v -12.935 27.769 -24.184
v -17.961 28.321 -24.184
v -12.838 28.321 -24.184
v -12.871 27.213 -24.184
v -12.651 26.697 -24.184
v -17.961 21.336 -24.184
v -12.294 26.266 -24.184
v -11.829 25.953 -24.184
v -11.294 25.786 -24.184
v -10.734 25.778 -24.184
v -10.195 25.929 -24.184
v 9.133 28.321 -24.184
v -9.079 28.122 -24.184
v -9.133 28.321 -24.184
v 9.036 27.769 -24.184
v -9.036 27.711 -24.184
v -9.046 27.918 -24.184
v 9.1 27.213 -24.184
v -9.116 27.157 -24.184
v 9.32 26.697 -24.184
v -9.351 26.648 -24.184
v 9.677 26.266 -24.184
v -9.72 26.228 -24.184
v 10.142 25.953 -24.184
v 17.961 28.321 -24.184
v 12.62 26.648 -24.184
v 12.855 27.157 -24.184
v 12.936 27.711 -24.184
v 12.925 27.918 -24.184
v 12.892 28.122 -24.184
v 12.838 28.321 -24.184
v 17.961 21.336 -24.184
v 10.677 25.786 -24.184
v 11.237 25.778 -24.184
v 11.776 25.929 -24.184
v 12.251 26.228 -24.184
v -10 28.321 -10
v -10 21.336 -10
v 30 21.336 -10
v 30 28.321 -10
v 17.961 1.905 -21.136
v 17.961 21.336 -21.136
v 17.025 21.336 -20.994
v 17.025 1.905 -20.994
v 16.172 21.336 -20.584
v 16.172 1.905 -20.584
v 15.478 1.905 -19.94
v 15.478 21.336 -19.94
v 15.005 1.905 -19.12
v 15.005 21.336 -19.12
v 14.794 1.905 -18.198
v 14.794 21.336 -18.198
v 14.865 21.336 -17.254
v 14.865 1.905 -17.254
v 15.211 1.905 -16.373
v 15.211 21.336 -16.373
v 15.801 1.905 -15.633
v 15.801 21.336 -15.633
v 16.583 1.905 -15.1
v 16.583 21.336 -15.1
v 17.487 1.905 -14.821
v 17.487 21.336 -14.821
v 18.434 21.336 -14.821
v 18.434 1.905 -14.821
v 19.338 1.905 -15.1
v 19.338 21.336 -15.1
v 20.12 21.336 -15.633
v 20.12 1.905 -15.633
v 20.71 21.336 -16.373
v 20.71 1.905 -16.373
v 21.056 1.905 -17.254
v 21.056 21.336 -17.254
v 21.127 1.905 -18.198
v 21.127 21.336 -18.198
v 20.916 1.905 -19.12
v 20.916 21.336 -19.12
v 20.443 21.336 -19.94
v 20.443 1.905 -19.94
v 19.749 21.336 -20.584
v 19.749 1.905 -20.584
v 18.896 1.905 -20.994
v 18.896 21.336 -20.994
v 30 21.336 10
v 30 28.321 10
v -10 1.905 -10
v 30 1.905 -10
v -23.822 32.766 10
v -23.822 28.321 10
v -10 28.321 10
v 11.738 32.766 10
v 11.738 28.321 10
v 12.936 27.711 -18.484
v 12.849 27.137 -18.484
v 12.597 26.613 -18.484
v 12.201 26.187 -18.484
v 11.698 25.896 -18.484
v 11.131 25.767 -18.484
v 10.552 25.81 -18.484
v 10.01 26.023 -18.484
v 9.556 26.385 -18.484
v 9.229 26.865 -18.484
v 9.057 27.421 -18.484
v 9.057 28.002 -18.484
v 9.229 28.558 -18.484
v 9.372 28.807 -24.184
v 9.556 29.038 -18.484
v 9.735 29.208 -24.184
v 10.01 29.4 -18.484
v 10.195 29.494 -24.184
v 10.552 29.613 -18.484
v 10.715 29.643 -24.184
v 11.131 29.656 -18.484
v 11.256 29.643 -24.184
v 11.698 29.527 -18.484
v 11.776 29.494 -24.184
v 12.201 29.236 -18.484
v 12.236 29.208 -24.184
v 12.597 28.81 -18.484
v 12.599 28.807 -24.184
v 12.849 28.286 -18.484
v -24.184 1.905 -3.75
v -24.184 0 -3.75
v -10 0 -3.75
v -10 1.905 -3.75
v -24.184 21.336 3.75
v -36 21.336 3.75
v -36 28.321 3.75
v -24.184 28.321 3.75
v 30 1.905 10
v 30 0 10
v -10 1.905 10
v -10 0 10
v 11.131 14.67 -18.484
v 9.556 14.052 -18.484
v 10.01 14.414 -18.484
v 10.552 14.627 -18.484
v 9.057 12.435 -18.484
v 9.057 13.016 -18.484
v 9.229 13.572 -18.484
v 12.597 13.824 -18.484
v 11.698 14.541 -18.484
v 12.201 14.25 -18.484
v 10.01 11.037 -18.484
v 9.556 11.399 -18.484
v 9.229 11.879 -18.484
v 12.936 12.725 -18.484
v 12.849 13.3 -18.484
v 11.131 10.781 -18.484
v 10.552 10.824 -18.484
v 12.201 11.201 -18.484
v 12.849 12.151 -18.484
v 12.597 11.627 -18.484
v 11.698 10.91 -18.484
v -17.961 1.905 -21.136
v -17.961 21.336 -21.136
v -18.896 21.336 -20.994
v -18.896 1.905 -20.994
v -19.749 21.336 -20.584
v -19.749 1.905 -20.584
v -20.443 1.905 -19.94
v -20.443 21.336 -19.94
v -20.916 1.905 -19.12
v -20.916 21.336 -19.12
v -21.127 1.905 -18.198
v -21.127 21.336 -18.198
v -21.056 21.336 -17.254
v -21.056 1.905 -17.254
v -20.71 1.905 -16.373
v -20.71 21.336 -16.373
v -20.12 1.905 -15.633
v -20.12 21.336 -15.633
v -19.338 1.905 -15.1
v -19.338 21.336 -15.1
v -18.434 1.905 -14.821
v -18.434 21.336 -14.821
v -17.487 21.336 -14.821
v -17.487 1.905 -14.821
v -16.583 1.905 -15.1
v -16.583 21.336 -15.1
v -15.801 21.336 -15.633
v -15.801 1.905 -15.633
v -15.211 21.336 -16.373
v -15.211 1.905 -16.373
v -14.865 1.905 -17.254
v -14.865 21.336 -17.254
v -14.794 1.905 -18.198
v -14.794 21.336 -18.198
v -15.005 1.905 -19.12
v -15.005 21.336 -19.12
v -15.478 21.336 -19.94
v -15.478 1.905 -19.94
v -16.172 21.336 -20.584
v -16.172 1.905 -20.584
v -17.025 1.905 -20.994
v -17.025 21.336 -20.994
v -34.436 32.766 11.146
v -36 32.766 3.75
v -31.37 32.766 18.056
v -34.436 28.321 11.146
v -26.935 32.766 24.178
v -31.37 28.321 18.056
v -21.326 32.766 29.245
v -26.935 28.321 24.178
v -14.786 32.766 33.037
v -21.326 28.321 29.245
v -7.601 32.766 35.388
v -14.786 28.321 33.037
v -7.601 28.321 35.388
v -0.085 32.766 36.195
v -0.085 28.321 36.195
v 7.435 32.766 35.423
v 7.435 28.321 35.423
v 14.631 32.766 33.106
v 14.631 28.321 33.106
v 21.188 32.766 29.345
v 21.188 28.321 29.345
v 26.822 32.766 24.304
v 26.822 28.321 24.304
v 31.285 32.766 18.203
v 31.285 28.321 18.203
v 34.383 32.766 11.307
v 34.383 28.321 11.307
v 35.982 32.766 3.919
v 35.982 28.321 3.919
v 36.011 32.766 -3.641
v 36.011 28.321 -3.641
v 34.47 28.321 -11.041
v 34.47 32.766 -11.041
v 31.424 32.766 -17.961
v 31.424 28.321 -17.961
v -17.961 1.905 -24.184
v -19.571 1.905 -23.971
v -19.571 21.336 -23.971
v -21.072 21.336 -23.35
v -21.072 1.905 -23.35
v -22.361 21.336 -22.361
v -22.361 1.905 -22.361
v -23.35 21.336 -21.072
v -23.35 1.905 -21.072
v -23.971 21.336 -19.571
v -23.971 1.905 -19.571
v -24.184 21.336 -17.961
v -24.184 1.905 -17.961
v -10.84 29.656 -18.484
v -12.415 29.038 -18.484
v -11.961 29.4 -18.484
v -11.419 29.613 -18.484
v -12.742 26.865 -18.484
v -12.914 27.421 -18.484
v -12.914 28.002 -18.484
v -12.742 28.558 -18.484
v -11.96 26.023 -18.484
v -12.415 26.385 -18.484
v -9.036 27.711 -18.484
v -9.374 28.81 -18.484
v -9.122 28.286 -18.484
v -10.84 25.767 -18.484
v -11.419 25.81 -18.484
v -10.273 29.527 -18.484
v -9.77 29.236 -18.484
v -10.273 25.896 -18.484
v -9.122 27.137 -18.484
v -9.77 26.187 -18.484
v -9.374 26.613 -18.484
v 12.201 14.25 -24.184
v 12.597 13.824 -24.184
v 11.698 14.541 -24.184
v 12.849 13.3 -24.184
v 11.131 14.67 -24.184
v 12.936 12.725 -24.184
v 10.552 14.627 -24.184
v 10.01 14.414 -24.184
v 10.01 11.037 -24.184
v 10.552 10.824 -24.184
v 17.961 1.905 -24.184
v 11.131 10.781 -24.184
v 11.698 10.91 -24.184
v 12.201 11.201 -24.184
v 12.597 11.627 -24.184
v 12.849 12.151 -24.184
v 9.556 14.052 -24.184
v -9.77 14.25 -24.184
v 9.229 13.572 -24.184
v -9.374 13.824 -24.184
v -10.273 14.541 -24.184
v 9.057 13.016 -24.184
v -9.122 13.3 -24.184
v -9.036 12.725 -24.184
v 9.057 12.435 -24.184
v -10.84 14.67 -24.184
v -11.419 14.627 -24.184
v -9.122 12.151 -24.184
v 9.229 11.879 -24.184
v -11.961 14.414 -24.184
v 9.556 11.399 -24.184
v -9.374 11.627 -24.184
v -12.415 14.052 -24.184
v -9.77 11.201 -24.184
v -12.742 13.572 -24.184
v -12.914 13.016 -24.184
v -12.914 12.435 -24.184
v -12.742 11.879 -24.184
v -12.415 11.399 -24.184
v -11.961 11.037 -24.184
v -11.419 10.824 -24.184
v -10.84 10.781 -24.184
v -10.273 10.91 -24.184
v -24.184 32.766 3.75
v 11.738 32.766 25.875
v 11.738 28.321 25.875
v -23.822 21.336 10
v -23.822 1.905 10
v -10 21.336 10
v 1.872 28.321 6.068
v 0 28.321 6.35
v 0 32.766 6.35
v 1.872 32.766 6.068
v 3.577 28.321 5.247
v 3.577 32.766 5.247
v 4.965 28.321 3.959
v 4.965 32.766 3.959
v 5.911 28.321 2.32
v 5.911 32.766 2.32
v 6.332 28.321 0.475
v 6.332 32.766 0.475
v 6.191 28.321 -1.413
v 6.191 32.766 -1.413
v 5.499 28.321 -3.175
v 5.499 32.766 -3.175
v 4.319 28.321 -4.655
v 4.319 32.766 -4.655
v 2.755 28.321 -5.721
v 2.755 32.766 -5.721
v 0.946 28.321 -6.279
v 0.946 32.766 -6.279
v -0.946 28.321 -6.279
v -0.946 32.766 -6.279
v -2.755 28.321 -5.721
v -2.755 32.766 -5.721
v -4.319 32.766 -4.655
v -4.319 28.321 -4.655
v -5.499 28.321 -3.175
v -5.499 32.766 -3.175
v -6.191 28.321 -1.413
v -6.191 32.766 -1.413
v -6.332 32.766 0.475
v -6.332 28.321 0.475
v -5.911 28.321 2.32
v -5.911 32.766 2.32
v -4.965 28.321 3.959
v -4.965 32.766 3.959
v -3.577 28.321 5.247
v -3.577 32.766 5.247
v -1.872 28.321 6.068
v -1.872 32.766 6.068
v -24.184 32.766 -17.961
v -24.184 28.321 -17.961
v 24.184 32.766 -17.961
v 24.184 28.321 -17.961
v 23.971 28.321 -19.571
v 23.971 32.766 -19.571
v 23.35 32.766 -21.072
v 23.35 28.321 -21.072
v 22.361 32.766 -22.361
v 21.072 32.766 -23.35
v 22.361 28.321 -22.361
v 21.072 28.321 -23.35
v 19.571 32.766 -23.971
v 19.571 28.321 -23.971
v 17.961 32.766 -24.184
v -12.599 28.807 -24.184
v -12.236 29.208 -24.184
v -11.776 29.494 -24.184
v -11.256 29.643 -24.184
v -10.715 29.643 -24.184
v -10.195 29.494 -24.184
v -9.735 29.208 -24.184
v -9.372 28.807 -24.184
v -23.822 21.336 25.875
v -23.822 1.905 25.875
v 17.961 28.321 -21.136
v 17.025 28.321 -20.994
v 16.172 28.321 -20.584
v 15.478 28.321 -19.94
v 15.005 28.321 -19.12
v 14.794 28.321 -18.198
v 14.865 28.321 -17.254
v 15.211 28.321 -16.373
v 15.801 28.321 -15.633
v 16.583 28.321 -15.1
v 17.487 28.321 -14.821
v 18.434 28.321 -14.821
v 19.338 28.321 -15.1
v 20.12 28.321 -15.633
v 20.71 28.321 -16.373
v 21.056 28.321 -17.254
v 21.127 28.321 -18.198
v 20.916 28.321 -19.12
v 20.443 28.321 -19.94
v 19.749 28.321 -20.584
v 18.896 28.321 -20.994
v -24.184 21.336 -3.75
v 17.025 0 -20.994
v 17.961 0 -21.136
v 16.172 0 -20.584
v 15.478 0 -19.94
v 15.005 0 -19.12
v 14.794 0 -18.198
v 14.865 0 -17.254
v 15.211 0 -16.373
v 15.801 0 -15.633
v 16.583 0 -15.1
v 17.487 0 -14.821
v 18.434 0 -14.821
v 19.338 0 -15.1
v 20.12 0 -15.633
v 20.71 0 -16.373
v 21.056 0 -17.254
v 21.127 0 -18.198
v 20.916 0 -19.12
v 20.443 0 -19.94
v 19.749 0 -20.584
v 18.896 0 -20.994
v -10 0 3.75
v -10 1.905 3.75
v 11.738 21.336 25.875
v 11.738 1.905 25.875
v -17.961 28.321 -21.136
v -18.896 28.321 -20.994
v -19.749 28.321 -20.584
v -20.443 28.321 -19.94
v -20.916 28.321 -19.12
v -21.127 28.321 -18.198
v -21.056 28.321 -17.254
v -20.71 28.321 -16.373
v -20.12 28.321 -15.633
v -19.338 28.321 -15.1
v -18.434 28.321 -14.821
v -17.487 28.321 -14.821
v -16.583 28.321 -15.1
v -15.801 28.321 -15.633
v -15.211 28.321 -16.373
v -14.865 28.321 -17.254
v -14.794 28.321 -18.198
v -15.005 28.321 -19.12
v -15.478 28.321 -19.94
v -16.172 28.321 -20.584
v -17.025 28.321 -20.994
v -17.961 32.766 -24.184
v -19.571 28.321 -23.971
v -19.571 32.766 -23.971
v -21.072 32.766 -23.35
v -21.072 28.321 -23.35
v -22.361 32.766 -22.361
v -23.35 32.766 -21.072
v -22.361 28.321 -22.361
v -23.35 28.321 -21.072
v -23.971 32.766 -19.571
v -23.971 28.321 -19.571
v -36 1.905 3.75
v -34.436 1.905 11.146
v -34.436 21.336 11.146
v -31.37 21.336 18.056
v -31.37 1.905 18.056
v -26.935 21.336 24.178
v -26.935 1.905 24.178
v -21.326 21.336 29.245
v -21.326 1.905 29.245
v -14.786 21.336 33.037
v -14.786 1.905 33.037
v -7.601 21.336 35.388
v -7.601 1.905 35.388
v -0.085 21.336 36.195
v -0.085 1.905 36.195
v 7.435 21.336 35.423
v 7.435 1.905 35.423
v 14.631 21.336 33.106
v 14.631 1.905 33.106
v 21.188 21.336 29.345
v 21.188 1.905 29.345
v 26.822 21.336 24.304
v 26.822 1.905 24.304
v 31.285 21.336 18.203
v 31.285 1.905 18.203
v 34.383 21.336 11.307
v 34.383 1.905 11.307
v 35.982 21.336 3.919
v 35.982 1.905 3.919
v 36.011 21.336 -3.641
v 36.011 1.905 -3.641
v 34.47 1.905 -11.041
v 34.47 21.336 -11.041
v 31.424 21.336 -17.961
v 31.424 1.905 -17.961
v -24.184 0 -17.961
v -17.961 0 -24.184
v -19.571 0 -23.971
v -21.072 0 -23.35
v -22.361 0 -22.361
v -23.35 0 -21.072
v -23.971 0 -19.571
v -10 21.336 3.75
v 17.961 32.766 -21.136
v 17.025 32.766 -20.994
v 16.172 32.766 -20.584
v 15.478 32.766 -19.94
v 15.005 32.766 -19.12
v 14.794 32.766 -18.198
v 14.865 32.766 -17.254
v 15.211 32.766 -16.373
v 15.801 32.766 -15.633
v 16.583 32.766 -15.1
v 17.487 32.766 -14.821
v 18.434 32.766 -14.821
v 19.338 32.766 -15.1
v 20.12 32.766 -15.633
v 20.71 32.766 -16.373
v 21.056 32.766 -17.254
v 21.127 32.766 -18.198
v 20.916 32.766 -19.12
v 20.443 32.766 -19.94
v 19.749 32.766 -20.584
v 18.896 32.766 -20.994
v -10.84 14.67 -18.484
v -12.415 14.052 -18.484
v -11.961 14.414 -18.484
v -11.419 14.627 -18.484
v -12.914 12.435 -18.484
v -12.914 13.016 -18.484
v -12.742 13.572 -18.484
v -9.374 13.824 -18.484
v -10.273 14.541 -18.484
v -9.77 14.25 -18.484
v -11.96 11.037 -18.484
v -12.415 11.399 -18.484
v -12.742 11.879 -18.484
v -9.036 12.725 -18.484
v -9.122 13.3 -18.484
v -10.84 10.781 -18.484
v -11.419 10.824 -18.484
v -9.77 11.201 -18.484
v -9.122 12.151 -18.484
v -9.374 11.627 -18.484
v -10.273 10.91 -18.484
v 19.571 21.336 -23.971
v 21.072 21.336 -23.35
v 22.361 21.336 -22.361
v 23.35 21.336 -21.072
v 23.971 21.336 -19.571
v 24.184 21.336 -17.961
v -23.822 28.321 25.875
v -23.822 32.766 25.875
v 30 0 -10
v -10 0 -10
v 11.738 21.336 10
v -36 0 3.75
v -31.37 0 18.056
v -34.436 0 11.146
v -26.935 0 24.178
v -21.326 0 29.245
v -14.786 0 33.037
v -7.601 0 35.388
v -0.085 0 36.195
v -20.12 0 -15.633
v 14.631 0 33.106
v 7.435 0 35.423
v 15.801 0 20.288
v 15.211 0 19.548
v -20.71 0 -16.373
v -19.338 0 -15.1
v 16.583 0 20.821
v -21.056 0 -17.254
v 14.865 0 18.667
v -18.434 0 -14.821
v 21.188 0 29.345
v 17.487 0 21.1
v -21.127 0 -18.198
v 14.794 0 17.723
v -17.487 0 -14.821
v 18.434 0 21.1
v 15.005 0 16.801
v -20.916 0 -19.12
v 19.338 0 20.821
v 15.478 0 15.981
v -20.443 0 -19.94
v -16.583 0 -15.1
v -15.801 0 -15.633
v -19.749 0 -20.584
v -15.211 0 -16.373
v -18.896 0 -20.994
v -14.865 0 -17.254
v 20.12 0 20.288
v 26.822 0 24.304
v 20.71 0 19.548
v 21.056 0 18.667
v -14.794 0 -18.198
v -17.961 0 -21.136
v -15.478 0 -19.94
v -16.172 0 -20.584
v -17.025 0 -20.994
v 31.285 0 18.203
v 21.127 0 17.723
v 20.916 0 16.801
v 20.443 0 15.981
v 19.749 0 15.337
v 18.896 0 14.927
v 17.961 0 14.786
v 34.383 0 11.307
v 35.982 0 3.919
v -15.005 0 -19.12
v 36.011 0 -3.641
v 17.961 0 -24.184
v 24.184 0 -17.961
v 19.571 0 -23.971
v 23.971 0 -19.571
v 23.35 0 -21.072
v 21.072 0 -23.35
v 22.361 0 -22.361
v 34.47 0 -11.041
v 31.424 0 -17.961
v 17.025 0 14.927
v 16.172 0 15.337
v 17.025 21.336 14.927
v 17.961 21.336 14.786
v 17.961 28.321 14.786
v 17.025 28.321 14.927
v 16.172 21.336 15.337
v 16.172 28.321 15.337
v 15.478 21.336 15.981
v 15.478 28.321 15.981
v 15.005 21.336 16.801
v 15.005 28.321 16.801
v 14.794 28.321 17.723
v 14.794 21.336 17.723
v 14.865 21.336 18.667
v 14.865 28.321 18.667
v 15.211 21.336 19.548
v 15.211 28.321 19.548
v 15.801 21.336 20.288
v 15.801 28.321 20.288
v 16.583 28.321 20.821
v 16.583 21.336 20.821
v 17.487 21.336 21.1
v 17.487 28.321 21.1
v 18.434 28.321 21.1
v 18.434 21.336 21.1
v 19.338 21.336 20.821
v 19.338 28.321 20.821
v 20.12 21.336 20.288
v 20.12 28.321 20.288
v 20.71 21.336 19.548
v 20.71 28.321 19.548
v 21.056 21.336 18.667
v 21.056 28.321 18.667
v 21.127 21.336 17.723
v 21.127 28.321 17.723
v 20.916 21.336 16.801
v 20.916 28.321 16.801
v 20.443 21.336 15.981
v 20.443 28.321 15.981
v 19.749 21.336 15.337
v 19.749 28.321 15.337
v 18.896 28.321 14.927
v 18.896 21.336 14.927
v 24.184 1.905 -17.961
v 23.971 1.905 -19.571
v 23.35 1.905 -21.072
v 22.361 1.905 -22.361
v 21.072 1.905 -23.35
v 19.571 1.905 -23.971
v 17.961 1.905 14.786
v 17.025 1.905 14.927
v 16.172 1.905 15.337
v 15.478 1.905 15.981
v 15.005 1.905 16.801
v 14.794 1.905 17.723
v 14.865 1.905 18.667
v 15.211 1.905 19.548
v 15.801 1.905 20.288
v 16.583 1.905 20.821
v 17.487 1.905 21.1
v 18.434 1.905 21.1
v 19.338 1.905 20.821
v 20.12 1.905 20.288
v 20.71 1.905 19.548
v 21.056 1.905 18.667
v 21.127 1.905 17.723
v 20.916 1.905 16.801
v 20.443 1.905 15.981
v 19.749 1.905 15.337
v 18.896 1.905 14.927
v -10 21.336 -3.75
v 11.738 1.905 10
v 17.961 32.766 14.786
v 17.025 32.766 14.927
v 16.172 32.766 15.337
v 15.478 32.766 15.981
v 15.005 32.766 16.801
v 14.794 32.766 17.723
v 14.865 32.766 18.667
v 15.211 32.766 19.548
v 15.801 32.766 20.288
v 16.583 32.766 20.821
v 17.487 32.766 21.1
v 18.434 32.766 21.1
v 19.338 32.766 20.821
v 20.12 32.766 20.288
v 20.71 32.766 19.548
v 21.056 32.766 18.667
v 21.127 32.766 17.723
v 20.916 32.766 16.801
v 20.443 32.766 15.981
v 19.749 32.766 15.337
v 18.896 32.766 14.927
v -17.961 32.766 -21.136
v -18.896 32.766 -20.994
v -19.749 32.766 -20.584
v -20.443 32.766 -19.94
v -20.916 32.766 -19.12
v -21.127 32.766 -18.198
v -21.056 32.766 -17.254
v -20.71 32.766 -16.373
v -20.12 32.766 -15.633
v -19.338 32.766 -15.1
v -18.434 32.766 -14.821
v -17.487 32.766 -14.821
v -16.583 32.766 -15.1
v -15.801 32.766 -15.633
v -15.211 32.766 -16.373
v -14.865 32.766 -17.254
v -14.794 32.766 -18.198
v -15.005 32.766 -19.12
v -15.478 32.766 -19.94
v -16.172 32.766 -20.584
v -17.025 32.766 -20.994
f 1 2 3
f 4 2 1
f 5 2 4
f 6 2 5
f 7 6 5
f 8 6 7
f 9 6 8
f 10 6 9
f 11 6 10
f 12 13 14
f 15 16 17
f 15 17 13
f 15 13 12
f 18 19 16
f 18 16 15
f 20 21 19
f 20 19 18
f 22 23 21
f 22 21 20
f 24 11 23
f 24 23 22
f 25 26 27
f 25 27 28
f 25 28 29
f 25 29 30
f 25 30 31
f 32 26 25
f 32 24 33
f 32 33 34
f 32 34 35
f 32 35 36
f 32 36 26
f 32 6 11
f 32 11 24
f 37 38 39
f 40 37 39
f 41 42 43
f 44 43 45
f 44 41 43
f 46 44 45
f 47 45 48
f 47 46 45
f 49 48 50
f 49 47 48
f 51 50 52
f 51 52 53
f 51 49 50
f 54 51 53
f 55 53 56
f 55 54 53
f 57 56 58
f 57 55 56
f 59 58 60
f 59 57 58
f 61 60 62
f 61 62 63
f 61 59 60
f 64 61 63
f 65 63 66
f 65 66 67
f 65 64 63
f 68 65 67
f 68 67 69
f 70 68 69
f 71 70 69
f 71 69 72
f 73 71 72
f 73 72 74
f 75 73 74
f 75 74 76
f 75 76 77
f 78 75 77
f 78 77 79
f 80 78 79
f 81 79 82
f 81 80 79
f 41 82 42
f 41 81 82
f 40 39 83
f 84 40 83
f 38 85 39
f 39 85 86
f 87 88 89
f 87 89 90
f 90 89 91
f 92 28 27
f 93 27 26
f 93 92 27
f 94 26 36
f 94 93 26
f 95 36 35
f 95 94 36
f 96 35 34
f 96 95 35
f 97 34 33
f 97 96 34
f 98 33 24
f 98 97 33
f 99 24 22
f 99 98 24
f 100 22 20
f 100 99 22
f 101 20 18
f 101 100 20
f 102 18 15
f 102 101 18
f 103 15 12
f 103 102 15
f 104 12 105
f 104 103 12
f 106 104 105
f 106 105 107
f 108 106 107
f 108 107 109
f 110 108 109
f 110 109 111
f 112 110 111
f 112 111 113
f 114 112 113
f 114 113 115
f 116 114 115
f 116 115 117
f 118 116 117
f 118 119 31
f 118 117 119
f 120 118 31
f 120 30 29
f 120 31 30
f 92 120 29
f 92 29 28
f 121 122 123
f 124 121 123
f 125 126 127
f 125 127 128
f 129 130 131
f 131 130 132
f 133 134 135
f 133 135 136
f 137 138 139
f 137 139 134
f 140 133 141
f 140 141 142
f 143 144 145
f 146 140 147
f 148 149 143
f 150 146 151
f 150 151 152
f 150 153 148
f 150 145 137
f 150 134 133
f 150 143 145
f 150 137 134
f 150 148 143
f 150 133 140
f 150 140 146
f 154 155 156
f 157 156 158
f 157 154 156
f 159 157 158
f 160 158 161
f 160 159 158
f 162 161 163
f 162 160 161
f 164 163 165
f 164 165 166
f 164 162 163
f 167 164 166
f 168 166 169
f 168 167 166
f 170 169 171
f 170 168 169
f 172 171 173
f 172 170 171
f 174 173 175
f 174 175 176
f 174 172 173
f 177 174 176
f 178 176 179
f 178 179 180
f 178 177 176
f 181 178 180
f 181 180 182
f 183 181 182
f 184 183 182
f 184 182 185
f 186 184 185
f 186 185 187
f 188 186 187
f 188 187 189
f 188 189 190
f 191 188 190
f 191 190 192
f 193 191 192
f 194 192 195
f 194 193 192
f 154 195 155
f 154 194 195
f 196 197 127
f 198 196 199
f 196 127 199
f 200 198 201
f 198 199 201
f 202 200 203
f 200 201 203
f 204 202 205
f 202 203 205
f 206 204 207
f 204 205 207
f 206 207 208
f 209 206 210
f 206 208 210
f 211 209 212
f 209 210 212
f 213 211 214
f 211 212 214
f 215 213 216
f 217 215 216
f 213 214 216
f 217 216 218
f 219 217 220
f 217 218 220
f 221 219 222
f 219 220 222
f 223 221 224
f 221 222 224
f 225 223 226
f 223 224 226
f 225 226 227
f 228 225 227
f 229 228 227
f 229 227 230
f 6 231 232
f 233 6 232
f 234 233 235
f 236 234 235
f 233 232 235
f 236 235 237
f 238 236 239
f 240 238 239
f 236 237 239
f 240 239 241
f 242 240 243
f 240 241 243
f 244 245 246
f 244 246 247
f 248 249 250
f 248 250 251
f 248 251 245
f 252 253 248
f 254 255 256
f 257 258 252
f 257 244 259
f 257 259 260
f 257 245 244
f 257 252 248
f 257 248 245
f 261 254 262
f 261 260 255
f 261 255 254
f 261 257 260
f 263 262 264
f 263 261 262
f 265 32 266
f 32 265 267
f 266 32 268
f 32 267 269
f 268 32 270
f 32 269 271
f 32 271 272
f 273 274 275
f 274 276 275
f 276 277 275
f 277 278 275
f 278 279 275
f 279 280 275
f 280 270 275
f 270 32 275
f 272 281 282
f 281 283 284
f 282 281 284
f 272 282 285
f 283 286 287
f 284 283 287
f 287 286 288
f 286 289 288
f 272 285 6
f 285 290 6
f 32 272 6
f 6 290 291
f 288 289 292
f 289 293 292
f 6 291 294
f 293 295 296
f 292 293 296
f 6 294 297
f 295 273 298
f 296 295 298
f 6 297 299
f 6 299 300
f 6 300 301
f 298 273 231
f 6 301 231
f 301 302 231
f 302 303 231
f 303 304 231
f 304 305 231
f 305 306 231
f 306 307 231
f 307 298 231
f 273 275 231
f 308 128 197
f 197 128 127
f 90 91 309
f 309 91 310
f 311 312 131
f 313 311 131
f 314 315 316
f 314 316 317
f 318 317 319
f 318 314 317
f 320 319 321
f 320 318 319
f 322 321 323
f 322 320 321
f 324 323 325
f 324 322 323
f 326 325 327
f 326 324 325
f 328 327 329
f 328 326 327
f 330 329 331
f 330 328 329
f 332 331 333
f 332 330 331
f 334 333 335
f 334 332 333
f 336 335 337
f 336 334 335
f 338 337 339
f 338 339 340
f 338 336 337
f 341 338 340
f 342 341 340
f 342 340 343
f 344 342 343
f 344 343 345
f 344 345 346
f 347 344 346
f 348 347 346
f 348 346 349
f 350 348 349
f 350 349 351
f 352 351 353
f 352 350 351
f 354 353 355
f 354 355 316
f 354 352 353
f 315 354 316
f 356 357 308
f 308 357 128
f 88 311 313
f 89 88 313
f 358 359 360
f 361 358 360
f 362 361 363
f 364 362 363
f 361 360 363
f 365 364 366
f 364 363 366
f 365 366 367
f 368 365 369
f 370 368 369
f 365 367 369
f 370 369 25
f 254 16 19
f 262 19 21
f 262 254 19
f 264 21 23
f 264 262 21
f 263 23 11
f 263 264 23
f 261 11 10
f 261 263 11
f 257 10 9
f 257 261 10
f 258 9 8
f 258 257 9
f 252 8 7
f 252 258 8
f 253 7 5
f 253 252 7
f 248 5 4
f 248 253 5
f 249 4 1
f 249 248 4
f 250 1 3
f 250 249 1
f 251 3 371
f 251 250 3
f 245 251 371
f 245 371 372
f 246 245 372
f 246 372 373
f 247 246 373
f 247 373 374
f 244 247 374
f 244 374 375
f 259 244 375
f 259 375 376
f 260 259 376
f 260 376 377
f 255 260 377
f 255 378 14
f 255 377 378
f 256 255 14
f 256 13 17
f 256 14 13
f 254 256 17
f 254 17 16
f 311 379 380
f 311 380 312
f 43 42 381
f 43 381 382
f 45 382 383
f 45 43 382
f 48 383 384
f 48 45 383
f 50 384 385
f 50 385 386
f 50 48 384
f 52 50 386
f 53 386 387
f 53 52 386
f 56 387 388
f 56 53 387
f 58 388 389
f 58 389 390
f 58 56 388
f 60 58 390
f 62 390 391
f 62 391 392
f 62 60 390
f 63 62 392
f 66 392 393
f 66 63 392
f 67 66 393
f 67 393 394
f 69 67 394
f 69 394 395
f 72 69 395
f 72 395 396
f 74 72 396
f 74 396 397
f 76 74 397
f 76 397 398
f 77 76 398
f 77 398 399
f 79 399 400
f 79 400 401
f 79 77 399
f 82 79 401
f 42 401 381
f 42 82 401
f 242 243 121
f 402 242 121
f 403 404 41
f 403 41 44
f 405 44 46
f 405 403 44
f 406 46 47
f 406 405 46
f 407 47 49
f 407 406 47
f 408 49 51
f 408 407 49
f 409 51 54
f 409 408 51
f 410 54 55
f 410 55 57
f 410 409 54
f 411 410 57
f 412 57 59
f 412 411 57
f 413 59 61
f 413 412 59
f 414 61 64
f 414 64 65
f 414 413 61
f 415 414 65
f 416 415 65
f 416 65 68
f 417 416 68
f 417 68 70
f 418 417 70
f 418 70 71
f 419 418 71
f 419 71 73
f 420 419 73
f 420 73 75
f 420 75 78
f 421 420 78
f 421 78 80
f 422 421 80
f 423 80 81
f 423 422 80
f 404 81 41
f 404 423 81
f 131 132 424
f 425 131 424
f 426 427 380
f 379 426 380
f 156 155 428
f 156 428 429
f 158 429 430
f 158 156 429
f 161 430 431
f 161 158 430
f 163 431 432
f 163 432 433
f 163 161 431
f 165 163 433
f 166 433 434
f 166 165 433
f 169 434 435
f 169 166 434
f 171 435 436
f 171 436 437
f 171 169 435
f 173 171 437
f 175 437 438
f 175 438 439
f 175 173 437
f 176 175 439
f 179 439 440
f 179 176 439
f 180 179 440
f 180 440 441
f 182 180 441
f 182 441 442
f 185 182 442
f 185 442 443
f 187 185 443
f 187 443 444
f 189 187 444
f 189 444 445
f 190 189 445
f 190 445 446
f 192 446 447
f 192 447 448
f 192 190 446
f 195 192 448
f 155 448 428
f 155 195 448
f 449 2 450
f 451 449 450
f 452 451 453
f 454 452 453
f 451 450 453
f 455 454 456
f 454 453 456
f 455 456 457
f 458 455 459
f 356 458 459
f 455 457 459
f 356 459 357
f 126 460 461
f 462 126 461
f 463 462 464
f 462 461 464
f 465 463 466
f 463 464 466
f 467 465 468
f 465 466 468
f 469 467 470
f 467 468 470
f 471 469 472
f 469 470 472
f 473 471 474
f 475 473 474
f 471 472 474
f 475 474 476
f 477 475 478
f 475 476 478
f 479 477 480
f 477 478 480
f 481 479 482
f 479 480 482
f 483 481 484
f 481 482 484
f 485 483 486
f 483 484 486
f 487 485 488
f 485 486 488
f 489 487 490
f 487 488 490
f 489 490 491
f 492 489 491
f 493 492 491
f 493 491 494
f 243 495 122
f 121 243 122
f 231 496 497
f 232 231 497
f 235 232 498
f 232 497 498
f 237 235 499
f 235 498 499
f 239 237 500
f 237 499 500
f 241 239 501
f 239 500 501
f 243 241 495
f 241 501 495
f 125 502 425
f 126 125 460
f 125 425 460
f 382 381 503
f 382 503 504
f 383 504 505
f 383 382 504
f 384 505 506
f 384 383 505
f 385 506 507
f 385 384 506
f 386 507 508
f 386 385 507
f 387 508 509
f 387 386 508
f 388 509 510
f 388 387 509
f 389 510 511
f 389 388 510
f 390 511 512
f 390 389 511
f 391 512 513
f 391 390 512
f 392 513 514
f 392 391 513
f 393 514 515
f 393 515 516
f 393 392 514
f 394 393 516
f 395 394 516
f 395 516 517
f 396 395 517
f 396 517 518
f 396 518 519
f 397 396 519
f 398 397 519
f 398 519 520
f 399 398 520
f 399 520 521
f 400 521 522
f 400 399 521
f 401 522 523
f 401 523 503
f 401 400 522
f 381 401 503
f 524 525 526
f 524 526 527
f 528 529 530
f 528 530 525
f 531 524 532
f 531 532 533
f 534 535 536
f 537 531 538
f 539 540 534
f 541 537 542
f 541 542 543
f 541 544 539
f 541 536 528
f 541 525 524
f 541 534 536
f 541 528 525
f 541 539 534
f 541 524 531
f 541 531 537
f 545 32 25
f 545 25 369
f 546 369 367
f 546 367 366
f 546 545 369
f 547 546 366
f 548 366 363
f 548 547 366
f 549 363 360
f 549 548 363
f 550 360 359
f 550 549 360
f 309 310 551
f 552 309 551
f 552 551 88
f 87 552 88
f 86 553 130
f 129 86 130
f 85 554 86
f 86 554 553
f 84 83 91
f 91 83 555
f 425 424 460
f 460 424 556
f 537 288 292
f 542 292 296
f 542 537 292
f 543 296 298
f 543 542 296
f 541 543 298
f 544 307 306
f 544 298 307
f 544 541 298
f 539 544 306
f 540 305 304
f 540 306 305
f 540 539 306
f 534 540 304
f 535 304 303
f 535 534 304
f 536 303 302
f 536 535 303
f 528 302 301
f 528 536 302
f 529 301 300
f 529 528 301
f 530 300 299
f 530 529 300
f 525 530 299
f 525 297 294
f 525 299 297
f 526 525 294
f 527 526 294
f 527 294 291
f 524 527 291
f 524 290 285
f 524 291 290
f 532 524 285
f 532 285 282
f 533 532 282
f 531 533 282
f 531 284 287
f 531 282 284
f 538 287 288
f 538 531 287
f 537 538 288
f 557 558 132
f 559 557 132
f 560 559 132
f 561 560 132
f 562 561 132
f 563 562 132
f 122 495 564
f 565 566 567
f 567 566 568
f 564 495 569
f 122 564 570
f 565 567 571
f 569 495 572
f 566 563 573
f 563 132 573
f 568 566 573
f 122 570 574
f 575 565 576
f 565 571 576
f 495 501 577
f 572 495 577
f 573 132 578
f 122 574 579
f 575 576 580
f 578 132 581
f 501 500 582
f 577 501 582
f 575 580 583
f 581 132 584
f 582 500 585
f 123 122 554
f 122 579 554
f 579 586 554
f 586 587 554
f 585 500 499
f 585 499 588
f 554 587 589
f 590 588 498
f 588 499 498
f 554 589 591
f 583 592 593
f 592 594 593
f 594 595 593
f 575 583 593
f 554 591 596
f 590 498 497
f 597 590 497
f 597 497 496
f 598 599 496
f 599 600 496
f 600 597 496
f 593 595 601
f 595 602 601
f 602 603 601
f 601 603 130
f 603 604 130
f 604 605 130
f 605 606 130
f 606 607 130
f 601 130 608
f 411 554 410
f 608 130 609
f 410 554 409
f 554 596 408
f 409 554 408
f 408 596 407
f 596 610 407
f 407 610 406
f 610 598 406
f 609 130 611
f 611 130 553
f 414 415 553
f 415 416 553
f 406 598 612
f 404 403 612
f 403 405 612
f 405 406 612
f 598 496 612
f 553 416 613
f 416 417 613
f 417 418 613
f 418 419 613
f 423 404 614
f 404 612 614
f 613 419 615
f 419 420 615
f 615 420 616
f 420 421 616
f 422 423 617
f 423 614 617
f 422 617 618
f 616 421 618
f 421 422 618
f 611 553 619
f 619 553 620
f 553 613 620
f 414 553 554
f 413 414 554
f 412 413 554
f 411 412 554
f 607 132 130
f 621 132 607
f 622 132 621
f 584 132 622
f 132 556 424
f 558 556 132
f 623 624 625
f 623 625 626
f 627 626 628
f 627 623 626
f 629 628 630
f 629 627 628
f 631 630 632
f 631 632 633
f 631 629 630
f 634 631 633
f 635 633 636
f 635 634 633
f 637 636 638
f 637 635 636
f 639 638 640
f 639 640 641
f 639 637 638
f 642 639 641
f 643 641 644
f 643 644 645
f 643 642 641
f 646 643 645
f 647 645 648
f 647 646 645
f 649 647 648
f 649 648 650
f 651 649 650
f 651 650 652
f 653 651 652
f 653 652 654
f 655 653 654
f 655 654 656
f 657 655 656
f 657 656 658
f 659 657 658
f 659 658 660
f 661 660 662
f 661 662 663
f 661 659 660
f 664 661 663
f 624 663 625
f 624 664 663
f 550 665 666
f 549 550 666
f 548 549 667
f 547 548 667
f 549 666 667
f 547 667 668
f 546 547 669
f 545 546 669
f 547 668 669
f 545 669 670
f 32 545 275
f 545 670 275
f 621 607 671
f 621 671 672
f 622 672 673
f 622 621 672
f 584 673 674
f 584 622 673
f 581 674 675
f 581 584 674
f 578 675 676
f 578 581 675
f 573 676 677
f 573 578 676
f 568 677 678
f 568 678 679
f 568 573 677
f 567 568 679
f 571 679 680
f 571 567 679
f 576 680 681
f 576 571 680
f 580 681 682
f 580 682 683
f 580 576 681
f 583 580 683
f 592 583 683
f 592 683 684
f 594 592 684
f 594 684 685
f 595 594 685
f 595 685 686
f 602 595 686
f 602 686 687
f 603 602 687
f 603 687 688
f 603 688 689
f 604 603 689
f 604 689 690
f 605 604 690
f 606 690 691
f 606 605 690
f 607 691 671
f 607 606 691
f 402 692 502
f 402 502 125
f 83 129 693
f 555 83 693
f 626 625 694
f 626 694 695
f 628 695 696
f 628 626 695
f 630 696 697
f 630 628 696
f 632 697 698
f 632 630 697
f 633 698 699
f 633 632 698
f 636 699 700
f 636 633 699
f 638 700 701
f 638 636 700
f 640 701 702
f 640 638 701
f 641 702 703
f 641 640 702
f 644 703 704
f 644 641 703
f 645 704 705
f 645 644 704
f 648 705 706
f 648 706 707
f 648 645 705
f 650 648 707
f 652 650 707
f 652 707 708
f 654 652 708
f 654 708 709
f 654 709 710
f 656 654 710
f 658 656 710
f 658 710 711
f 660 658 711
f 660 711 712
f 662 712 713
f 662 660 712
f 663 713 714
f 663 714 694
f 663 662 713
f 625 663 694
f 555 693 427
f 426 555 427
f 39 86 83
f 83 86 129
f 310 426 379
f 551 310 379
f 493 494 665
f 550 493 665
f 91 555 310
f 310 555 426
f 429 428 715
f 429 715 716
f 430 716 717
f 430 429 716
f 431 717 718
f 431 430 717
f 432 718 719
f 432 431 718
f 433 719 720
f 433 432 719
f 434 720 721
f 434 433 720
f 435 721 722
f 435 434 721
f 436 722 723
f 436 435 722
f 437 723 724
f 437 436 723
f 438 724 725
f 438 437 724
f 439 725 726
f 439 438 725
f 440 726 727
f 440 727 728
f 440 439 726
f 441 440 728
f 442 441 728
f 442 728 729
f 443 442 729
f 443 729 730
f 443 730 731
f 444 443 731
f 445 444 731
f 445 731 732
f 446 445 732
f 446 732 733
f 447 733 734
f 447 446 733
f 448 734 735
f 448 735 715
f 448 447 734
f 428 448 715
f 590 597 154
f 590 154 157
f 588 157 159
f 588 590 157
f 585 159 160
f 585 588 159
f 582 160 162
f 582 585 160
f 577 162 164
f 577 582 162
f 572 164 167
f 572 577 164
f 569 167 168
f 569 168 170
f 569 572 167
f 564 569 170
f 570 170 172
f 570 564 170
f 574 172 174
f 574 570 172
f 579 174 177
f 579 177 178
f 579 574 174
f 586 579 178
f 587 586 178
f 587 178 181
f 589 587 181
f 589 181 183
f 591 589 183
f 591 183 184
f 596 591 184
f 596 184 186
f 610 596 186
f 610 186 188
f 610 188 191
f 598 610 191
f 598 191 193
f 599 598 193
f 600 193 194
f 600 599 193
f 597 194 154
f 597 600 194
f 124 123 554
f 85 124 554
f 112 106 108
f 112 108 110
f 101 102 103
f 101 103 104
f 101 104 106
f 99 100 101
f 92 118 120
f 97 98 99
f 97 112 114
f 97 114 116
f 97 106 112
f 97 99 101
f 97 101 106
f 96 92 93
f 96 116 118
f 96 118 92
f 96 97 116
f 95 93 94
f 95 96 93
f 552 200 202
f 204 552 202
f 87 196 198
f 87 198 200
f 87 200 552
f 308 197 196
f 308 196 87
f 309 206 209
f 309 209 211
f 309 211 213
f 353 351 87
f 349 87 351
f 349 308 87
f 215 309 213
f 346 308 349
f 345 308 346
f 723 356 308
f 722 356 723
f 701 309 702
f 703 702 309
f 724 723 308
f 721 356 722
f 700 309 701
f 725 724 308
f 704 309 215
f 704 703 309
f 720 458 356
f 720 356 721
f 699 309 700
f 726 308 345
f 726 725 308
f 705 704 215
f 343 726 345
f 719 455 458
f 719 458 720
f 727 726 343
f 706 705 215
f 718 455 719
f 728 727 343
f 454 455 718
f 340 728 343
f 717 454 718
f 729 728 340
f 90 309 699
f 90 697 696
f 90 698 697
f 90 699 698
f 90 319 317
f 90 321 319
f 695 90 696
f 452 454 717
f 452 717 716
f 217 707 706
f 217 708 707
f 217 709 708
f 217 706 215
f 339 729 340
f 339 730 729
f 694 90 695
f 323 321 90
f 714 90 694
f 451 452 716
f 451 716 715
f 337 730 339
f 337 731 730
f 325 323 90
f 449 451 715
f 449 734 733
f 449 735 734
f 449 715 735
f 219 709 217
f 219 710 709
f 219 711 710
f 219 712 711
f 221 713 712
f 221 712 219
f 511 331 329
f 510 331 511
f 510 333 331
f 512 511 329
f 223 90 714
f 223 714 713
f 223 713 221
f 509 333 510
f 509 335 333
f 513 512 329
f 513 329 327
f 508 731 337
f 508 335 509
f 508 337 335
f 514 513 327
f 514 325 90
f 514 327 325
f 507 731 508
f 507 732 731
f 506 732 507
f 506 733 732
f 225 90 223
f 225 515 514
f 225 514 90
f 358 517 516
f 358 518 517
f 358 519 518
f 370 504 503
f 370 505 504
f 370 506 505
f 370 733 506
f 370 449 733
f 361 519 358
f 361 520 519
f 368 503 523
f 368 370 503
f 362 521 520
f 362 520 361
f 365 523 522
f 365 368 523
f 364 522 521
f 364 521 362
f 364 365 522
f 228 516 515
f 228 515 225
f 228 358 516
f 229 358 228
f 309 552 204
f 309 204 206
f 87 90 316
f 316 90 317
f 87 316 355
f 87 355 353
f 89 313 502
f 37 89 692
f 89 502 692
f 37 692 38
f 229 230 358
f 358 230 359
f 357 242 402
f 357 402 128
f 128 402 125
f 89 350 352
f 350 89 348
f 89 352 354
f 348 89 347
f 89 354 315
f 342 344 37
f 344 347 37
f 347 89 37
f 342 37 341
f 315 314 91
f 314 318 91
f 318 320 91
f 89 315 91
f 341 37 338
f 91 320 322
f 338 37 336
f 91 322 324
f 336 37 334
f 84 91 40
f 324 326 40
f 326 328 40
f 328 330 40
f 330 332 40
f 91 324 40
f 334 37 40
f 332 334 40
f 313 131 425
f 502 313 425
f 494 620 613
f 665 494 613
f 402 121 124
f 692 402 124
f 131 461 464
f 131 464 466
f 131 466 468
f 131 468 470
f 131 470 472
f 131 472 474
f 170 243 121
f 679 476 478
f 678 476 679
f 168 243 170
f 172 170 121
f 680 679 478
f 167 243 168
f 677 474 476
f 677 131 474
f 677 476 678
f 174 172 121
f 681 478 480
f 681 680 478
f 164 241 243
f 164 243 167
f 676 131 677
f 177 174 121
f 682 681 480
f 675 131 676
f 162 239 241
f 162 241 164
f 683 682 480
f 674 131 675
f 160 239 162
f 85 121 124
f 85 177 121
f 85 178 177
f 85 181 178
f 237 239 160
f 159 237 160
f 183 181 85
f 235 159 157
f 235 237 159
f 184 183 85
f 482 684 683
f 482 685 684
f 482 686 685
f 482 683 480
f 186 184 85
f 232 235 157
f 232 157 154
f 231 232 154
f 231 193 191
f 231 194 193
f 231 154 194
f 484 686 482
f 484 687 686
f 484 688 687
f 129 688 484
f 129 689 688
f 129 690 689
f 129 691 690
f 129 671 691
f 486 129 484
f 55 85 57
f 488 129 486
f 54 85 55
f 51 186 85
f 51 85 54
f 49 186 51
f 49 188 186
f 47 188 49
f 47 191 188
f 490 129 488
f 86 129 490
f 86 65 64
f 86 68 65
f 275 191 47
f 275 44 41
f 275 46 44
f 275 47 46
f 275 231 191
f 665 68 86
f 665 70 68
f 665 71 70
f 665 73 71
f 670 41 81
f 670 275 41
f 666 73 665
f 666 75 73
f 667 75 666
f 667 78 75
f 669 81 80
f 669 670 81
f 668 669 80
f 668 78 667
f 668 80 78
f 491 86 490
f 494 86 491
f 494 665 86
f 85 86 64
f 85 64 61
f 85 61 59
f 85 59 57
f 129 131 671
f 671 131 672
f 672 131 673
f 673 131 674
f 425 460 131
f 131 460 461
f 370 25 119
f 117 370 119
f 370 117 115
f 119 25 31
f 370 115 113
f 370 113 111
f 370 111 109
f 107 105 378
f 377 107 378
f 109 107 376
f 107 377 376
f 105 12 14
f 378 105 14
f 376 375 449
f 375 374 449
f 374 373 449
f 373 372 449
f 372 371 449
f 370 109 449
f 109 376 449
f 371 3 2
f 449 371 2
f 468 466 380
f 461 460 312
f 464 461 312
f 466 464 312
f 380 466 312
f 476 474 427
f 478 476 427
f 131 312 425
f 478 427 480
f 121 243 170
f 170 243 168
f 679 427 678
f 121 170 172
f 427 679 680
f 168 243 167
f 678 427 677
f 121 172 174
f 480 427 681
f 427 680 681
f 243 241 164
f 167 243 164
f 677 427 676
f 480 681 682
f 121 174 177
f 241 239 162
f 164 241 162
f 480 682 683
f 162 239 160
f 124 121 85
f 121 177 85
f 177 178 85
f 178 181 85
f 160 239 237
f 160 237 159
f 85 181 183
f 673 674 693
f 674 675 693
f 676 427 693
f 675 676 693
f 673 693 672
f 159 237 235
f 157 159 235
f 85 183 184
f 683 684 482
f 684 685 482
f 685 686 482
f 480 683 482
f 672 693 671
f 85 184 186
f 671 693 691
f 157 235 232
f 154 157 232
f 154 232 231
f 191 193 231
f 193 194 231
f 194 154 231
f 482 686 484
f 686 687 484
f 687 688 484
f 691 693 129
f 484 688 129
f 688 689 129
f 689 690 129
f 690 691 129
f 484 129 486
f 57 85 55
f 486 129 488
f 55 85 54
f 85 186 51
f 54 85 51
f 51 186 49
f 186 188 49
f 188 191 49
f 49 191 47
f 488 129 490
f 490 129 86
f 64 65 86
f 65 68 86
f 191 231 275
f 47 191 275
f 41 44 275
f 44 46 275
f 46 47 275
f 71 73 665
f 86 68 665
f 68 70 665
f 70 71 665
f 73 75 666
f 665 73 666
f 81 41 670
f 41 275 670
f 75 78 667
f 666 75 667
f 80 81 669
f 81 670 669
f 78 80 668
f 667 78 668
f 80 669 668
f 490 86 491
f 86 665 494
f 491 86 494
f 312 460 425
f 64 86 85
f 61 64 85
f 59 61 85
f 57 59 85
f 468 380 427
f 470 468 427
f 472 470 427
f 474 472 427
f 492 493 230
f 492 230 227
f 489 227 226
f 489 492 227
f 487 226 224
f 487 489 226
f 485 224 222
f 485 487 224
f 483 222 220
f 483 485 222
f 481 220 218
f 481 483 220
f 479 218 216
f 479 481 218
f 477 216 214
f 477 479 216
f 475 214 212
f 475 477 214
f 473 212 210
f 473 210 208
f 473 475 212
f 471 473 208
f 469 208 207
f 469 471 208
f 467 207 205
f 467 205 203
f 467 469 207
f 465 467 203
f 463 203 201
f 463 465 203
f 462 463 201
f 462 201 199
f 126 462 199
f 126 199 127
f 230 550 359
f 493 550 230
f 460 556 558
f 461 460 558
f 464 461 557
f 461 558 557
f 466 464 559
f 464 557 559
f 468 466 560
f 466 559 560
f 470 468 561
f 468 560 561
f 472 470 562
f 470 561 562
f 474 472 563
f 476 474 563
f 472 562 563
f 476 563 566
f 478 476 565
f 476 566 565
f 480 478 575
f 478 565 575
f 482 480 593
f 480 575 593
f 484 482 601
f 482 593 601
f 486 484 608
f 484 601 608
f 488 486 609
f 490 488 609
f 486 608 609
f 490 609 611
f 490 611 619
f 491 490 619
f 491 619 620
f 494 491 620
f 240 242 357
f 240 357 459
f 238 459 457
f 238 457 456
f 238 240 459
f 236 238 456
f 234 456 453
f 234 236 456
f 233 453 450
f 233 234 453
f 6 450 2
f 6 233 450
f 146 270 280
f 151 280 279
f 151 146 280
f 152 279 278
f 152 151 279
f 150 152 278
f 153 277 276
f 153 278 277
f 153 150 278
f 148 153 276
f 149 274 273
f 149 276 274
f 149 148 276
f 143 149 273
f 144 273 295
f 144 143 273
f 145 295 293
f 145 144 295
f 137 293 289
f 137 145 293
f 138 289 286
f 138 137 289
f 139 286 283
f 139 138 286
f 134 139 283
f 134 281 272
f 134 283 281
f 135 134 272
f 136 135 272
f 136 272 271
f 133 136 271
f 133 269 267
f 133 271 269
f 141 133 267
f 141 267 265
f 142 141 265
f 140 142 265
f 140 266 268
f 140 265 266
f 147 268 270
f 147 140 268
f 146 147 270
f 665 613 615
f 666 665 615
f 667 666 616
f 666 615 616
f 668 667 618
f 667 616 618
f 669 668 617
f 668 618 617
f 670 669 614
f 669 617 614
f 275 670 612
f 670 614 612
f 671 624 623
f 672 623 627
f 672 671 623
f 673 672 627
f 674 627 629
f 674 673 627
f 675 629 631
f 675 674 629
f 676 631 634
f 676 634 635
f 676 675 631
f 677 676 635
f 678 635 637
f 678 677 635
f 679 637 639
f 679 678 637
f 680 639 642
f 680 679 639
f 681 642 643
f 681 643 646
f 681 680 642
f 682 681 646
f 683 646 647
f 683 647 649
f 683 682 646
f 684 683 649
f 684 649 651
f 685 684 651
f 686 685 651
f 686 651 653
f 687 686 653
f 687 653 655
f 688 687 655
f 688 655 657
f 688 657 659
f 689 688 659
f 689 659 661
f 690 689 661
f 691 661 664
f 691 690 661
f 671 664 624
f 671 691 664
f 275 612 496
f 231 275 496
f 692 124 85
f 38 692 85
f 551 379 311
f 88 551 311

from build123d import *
from build123d.topology import SkipClean

# Parameters (mm, degrees)
SKETCH2_R               = 3.175
BOSS_EXTRUDE1_DEPTH     = 1.905
SKETCH3_R               = 3.175
BOSS_EXTRUDE2_DEPTH     = 19.431
SKETCH4_R               = 3.175
BOSS_EXTRUDE3_DEPTH     = 6.985
SKETCH5_R               = 6.35
SKETCH5_R_2             = 3.175
BOSS_EXTRUDE4_DEPTH     = 4.445
CUT_EXTRUDE1_DEPTH      = 78.648267988
CUT_EXTRUDE1_DEPTH_BACK = 5.7
SKETCH6_R               = 1.95


with BuildPart() as part:
    # Sketch2 → Boss-Extrude1 (new body)
    with BuildSketch(Plane(origin=(0, 0, 0), x_dir=(1, 0, 0), z_dir=(0, 1, 0))):
        with BuildLine():
            Line((-24.183512242, 17.960512242), (-24.183512242, 3.75))
            Line((-24.183512242, 3.75), (-10, 3.75))
            Line((-10, 3.75), (-10, 10))
            Line((-10, 10), (30, 10))
            Line((30, 10), (30, -10))
            Line((30, -10), (11.737512242, -10))
            Line((11.737512242, -10), (10, -10))
            Line((10, -10), (0, -10))
            Line((0, -10), (-10, -10))
            Line((-10, -10), (-10, -3.75))
            Line((-10, -3.75), (-24.183512242, -3.75))
            Line((-24.183512242, -3.75), (-36.000215624, -3.75))
            ThreePointArc((-36.000215624, -3.75), (11.093733439, -34.452969442), (31.4244813, 17.960512242))
            Line((31.4244813, 17.960512242), (24.183512242, 17.960512242))
            ThreePointArc((24.183512242, 17.960512242), (22.360837741, 22.360837741), (17.960512242, 24.183512242))
            Line((17.960512242, 24.183512242), (-17.960512242, 24.183512242))
            ThreePointArc((-17.960512242, 24.183512242), (-22.360837741, 22.360837741), (-24.183512242, 17.960512242))
        make_face()
        with Locations(Location((-17.960512242, 17.960512242, 0), (0, 0, 90))):
            Circle(SKETCH2_R, mode=Mode.SUBTRACT)
        with Locations(Location((17.960512242, 17.960512242, 0), (0, 0, 90))):
            Circle(SKETCH2_R, mode=Mode.SUBTRACT)
        with Locations(Location((17.960512242, -17.960512242, 0), (0, 0, 90))):
            Circle(SKETCH2_R, mode=Mode.SUBTRACT)
    extrude(amount=BOSS_EXTRUDE1_DEPTH)


with BuildPart() as body_2:
    # Sketch3 → Boss-Extrude2 (new body)
    with BuildSketch(Plane(origin=(0, 1.905, 0), x_dir=(1, 0, 0), z_dir=(0, 1, 0))):
        with BuildLine():
            Line((-23.822487758, -25.875), (-23.822487758, -10))
            Line((-23.822487758, -10), (-17.960512242, -10))
            Line((-17.960512242, -10), (-10, -10))
            Line((-10, -10), (-10, -3.75))
            Line((-10, -3.75), (-36.000215624, -3.75))
            ThreePointArc((-36.000215624, -3.75), (11.093733439, -34.452969442), (31.4244813, 17.960512242))
            Line((31.4244813, 17.960512242), (24.183512242, 17.960512242))
            ThreePointArc((24.183512242, 17.960512242), (22.360837741, 22.360837741), (17.960512242, 24.183512242))
            Line((17.960512242, 24.183512242), (-17.960512242, 24.183512242))
            ThreePointArc((-17.960512242, 24.183512242), (-22.360837741, 22.360837741), (-24.183512242, 17.960512242))
            Line((-24.183512242, 17.960512242), (-24.183512242, 3.75))
            Line((-24.183512242, 3.75), (-10, 3.75))
            Line((-10, 3.75), (-10, 10))
            Line((-10, 10), (30, 10))
            Line((30, 10), (30, -10))
            Line((30, -10), (11.737512242, -10))
            Line((11.737512242, -10), (11.737512242, -11.737512242))
            Line((11.737512242, -11.737512242), (11.737512242, -17.960512242))
            Line((11.737512242, -17.960512242), (11.737512242, -25.875))
            Line((11.737512242, -25.875), (-23.822487758, -25.875))
        make_face()
        with Locations(Location((17.960512242, -17.960512242, 0), (0, 0, 90))):
            Circle(SKETCH3_R, mode=Mode.SUBTRACT)
        with Locations(Location((-17.960512242, 17.960512242, 0), (0, 0, 90))):
            Circle(SKETCH3_R, mode=Mode.SUBTRACT)
        with Locations(Location((17.960512242, 17.960512242, 0), (0, 0, 90))):
            Circle(SKETCH3_R, mode=Mode.SUBTRACT)
    extrude(amount=BOSS_EXTRUDE2_DEPTH)

    # Sketch4 → Boss-Extrude3 (add)
    with SkipClean():  # the faces are left unmerged after this step: merging them gives an invalid solid
        with BuildSketch(Plane(origin=(0, 21.336, 0), x_dir=(1, 0, 0), z_dir=(0, 1, 0))):
            with BuildLine():
                Line((-24.183512242, -3.75), (-24.183512242, 3.75))
                Line((-24.183512242, 3.75), (-24.183512242, 17.960512242))
                ThreePointArc((-24.183512242, 17.960512242), (-22.360837741, 22.360837741), (-17.960512242, 24.183512242))
                Line((-17.960512242, 24.183512242), (17.960512242, 24.183512242))
                ThreePointArc((17.960512242, 24.183512242), (22.360837741, 22.360837741), (24.183512242, 17.960512242))
                Line((24.183512242, 17.960512242), (31.4244813, 17.960512242))
                ThreePointArc((31.4244813, 17.960512242), (11.093733439, -34.452969442), (-36.000215624, -3.75))
                Line((-36.000215624, -3.75), (-24.183512242, -3.75))
            make_face()
            with Locations(Location((17.960512242, -17.960512242, 0), (0, 0, 90))):
                Circle(SKETCH4_R, mode=Mode.SUBTRACT)
            with Locations(Location((17.960512242, 17.960512242, 0), (0, 0, 90))):
                Circle(SKETCH4_R, mode=Mode.SUBTRACT)
            with Locations(Location((-17.960512242, 17.960512242, 0), (0, 0, 90))):
                Circle(SKETCH4_R, mode=Mode.SUBTRACT)
            Polygon((-10, -3.75), (-10, 0), (-10, 3.75), (-10, 10), (30, 10), (30, -10), (11.737512242, -10), (11.737512242, -25.875), (-23.822487758, -25.875), (-23.822487758, -10), (-10, -10), align=None, mode=Mode.SUBTRACT)
        extrude(amount=BOSS_EXTRUDE3_DEPTH)

    # Sketch5 → Boss-Extrude4 (add)
    with SkipClean():  # the faces are left unmerged after this step: merging them gives an invalid solid
        with BuildSketch(Plane(origin=(0, 28.321, 0), x_dir=(1, 0, 0), z_dir=(0, 1, 0))):
            with BuildLine():
                Line((-24.183512242, 17.960512242), (-24.183512242, -3.75))
                Line((-24.183512242, -3.75), (-36.000215624, -3.75))
                ThreePointArc((-36.000215624, -3.75), (11.093733439, -34.452969442), (31.4244813, 17.960512242))
                Line((31.4244813, 17.960512242), (24.183512242, 17.960512242))
                ThreePointArc((24.183512242, 17.960512242), (22.360837741, 22.360837741), (17.960512242, 24.183512242))
                Line((17.960512242, 24.183512242), (-17.960512242, 24.183512242))
                ThreePointArc((-17.960512242, 24.183512242), (-22.360837741, 22.360837741), (-24.183512242, 17.960512242))
            make_face()
            with Locations(Location((0, 0, 0), (0, 0, 270))):
                Circle(SKETCH5_R, mode=Mode.SUBTRACT)
            with Locations(Location((17.960512242, -17.960512242, 0), (0, 0, 90))):
                Circle(SKETCH5_R_2, mode=Mode.SUBTRACT)
            with Locations(Location((17.960512242, 17.960512242, 0), (0, 0, 90))):
                Circle(SKETCH5_R_2, mode=Mode.SUBTRACT)
            with Locations(Location((-17.960512242, 17.960512242, 0), (0, 0, 90))):
                Circle(SKETCH5_R_2, mode=Mode.SUBTRACT)
            Polygon((11.737512242, -25.875), (-23.822487758, -25.875), (-23.822487758, -10), (-17.960512242, -10), (-10, -10), (0, -10), (10, -10), (11.737512242, -10), (11.737512242, -11.737512242), (11.737512242, -17.960512242), align=None, mode=Mode.SUBTRACT)
        extrude(amount=BOSS_EXTRUDE4_DEPTH)

    # Sketch6 → Cut-Extrude1 (cut, two sides: drawn at the far end of the back side and taken through both)
    with SkipClean():  # the faces are left unmerged after this step: merging them gives an invalid solid
        with BuildSketch(Plane(origin=(0, 0, -24.183512242), x_dir=(-1, 0, 0), z_dir=(0, 0, -1)).offset(-CUT_EXTRUDE1_DEPTH_BACK)):
            with Locations(Location((-10.9855, 27.711479032, 0), (0, 0, 180))):
                Circle(SKETCH6_R)
            with Locations(Location((10.9855, 27.711479032, 0), (0, 0, 180))):
                Circle(SKETCH6_R)
            with Locations(Location((10.9855, 12.725479032, 0), (0, 0, 180))):
                Circle(SKETCH6_R)
            with Locations(Location((-10.9855, 12.725479032, 0), (0, 0, 180))):
                Circle(SKETCH6_R)
        extrude(amount=CUT_EXTRUDE1_DEPTH + CUT_EXTRUDE1_DEPTH_BACK, mode=Mode.SUBTRACT)


solid = Compound([part.part, body_2.part])
